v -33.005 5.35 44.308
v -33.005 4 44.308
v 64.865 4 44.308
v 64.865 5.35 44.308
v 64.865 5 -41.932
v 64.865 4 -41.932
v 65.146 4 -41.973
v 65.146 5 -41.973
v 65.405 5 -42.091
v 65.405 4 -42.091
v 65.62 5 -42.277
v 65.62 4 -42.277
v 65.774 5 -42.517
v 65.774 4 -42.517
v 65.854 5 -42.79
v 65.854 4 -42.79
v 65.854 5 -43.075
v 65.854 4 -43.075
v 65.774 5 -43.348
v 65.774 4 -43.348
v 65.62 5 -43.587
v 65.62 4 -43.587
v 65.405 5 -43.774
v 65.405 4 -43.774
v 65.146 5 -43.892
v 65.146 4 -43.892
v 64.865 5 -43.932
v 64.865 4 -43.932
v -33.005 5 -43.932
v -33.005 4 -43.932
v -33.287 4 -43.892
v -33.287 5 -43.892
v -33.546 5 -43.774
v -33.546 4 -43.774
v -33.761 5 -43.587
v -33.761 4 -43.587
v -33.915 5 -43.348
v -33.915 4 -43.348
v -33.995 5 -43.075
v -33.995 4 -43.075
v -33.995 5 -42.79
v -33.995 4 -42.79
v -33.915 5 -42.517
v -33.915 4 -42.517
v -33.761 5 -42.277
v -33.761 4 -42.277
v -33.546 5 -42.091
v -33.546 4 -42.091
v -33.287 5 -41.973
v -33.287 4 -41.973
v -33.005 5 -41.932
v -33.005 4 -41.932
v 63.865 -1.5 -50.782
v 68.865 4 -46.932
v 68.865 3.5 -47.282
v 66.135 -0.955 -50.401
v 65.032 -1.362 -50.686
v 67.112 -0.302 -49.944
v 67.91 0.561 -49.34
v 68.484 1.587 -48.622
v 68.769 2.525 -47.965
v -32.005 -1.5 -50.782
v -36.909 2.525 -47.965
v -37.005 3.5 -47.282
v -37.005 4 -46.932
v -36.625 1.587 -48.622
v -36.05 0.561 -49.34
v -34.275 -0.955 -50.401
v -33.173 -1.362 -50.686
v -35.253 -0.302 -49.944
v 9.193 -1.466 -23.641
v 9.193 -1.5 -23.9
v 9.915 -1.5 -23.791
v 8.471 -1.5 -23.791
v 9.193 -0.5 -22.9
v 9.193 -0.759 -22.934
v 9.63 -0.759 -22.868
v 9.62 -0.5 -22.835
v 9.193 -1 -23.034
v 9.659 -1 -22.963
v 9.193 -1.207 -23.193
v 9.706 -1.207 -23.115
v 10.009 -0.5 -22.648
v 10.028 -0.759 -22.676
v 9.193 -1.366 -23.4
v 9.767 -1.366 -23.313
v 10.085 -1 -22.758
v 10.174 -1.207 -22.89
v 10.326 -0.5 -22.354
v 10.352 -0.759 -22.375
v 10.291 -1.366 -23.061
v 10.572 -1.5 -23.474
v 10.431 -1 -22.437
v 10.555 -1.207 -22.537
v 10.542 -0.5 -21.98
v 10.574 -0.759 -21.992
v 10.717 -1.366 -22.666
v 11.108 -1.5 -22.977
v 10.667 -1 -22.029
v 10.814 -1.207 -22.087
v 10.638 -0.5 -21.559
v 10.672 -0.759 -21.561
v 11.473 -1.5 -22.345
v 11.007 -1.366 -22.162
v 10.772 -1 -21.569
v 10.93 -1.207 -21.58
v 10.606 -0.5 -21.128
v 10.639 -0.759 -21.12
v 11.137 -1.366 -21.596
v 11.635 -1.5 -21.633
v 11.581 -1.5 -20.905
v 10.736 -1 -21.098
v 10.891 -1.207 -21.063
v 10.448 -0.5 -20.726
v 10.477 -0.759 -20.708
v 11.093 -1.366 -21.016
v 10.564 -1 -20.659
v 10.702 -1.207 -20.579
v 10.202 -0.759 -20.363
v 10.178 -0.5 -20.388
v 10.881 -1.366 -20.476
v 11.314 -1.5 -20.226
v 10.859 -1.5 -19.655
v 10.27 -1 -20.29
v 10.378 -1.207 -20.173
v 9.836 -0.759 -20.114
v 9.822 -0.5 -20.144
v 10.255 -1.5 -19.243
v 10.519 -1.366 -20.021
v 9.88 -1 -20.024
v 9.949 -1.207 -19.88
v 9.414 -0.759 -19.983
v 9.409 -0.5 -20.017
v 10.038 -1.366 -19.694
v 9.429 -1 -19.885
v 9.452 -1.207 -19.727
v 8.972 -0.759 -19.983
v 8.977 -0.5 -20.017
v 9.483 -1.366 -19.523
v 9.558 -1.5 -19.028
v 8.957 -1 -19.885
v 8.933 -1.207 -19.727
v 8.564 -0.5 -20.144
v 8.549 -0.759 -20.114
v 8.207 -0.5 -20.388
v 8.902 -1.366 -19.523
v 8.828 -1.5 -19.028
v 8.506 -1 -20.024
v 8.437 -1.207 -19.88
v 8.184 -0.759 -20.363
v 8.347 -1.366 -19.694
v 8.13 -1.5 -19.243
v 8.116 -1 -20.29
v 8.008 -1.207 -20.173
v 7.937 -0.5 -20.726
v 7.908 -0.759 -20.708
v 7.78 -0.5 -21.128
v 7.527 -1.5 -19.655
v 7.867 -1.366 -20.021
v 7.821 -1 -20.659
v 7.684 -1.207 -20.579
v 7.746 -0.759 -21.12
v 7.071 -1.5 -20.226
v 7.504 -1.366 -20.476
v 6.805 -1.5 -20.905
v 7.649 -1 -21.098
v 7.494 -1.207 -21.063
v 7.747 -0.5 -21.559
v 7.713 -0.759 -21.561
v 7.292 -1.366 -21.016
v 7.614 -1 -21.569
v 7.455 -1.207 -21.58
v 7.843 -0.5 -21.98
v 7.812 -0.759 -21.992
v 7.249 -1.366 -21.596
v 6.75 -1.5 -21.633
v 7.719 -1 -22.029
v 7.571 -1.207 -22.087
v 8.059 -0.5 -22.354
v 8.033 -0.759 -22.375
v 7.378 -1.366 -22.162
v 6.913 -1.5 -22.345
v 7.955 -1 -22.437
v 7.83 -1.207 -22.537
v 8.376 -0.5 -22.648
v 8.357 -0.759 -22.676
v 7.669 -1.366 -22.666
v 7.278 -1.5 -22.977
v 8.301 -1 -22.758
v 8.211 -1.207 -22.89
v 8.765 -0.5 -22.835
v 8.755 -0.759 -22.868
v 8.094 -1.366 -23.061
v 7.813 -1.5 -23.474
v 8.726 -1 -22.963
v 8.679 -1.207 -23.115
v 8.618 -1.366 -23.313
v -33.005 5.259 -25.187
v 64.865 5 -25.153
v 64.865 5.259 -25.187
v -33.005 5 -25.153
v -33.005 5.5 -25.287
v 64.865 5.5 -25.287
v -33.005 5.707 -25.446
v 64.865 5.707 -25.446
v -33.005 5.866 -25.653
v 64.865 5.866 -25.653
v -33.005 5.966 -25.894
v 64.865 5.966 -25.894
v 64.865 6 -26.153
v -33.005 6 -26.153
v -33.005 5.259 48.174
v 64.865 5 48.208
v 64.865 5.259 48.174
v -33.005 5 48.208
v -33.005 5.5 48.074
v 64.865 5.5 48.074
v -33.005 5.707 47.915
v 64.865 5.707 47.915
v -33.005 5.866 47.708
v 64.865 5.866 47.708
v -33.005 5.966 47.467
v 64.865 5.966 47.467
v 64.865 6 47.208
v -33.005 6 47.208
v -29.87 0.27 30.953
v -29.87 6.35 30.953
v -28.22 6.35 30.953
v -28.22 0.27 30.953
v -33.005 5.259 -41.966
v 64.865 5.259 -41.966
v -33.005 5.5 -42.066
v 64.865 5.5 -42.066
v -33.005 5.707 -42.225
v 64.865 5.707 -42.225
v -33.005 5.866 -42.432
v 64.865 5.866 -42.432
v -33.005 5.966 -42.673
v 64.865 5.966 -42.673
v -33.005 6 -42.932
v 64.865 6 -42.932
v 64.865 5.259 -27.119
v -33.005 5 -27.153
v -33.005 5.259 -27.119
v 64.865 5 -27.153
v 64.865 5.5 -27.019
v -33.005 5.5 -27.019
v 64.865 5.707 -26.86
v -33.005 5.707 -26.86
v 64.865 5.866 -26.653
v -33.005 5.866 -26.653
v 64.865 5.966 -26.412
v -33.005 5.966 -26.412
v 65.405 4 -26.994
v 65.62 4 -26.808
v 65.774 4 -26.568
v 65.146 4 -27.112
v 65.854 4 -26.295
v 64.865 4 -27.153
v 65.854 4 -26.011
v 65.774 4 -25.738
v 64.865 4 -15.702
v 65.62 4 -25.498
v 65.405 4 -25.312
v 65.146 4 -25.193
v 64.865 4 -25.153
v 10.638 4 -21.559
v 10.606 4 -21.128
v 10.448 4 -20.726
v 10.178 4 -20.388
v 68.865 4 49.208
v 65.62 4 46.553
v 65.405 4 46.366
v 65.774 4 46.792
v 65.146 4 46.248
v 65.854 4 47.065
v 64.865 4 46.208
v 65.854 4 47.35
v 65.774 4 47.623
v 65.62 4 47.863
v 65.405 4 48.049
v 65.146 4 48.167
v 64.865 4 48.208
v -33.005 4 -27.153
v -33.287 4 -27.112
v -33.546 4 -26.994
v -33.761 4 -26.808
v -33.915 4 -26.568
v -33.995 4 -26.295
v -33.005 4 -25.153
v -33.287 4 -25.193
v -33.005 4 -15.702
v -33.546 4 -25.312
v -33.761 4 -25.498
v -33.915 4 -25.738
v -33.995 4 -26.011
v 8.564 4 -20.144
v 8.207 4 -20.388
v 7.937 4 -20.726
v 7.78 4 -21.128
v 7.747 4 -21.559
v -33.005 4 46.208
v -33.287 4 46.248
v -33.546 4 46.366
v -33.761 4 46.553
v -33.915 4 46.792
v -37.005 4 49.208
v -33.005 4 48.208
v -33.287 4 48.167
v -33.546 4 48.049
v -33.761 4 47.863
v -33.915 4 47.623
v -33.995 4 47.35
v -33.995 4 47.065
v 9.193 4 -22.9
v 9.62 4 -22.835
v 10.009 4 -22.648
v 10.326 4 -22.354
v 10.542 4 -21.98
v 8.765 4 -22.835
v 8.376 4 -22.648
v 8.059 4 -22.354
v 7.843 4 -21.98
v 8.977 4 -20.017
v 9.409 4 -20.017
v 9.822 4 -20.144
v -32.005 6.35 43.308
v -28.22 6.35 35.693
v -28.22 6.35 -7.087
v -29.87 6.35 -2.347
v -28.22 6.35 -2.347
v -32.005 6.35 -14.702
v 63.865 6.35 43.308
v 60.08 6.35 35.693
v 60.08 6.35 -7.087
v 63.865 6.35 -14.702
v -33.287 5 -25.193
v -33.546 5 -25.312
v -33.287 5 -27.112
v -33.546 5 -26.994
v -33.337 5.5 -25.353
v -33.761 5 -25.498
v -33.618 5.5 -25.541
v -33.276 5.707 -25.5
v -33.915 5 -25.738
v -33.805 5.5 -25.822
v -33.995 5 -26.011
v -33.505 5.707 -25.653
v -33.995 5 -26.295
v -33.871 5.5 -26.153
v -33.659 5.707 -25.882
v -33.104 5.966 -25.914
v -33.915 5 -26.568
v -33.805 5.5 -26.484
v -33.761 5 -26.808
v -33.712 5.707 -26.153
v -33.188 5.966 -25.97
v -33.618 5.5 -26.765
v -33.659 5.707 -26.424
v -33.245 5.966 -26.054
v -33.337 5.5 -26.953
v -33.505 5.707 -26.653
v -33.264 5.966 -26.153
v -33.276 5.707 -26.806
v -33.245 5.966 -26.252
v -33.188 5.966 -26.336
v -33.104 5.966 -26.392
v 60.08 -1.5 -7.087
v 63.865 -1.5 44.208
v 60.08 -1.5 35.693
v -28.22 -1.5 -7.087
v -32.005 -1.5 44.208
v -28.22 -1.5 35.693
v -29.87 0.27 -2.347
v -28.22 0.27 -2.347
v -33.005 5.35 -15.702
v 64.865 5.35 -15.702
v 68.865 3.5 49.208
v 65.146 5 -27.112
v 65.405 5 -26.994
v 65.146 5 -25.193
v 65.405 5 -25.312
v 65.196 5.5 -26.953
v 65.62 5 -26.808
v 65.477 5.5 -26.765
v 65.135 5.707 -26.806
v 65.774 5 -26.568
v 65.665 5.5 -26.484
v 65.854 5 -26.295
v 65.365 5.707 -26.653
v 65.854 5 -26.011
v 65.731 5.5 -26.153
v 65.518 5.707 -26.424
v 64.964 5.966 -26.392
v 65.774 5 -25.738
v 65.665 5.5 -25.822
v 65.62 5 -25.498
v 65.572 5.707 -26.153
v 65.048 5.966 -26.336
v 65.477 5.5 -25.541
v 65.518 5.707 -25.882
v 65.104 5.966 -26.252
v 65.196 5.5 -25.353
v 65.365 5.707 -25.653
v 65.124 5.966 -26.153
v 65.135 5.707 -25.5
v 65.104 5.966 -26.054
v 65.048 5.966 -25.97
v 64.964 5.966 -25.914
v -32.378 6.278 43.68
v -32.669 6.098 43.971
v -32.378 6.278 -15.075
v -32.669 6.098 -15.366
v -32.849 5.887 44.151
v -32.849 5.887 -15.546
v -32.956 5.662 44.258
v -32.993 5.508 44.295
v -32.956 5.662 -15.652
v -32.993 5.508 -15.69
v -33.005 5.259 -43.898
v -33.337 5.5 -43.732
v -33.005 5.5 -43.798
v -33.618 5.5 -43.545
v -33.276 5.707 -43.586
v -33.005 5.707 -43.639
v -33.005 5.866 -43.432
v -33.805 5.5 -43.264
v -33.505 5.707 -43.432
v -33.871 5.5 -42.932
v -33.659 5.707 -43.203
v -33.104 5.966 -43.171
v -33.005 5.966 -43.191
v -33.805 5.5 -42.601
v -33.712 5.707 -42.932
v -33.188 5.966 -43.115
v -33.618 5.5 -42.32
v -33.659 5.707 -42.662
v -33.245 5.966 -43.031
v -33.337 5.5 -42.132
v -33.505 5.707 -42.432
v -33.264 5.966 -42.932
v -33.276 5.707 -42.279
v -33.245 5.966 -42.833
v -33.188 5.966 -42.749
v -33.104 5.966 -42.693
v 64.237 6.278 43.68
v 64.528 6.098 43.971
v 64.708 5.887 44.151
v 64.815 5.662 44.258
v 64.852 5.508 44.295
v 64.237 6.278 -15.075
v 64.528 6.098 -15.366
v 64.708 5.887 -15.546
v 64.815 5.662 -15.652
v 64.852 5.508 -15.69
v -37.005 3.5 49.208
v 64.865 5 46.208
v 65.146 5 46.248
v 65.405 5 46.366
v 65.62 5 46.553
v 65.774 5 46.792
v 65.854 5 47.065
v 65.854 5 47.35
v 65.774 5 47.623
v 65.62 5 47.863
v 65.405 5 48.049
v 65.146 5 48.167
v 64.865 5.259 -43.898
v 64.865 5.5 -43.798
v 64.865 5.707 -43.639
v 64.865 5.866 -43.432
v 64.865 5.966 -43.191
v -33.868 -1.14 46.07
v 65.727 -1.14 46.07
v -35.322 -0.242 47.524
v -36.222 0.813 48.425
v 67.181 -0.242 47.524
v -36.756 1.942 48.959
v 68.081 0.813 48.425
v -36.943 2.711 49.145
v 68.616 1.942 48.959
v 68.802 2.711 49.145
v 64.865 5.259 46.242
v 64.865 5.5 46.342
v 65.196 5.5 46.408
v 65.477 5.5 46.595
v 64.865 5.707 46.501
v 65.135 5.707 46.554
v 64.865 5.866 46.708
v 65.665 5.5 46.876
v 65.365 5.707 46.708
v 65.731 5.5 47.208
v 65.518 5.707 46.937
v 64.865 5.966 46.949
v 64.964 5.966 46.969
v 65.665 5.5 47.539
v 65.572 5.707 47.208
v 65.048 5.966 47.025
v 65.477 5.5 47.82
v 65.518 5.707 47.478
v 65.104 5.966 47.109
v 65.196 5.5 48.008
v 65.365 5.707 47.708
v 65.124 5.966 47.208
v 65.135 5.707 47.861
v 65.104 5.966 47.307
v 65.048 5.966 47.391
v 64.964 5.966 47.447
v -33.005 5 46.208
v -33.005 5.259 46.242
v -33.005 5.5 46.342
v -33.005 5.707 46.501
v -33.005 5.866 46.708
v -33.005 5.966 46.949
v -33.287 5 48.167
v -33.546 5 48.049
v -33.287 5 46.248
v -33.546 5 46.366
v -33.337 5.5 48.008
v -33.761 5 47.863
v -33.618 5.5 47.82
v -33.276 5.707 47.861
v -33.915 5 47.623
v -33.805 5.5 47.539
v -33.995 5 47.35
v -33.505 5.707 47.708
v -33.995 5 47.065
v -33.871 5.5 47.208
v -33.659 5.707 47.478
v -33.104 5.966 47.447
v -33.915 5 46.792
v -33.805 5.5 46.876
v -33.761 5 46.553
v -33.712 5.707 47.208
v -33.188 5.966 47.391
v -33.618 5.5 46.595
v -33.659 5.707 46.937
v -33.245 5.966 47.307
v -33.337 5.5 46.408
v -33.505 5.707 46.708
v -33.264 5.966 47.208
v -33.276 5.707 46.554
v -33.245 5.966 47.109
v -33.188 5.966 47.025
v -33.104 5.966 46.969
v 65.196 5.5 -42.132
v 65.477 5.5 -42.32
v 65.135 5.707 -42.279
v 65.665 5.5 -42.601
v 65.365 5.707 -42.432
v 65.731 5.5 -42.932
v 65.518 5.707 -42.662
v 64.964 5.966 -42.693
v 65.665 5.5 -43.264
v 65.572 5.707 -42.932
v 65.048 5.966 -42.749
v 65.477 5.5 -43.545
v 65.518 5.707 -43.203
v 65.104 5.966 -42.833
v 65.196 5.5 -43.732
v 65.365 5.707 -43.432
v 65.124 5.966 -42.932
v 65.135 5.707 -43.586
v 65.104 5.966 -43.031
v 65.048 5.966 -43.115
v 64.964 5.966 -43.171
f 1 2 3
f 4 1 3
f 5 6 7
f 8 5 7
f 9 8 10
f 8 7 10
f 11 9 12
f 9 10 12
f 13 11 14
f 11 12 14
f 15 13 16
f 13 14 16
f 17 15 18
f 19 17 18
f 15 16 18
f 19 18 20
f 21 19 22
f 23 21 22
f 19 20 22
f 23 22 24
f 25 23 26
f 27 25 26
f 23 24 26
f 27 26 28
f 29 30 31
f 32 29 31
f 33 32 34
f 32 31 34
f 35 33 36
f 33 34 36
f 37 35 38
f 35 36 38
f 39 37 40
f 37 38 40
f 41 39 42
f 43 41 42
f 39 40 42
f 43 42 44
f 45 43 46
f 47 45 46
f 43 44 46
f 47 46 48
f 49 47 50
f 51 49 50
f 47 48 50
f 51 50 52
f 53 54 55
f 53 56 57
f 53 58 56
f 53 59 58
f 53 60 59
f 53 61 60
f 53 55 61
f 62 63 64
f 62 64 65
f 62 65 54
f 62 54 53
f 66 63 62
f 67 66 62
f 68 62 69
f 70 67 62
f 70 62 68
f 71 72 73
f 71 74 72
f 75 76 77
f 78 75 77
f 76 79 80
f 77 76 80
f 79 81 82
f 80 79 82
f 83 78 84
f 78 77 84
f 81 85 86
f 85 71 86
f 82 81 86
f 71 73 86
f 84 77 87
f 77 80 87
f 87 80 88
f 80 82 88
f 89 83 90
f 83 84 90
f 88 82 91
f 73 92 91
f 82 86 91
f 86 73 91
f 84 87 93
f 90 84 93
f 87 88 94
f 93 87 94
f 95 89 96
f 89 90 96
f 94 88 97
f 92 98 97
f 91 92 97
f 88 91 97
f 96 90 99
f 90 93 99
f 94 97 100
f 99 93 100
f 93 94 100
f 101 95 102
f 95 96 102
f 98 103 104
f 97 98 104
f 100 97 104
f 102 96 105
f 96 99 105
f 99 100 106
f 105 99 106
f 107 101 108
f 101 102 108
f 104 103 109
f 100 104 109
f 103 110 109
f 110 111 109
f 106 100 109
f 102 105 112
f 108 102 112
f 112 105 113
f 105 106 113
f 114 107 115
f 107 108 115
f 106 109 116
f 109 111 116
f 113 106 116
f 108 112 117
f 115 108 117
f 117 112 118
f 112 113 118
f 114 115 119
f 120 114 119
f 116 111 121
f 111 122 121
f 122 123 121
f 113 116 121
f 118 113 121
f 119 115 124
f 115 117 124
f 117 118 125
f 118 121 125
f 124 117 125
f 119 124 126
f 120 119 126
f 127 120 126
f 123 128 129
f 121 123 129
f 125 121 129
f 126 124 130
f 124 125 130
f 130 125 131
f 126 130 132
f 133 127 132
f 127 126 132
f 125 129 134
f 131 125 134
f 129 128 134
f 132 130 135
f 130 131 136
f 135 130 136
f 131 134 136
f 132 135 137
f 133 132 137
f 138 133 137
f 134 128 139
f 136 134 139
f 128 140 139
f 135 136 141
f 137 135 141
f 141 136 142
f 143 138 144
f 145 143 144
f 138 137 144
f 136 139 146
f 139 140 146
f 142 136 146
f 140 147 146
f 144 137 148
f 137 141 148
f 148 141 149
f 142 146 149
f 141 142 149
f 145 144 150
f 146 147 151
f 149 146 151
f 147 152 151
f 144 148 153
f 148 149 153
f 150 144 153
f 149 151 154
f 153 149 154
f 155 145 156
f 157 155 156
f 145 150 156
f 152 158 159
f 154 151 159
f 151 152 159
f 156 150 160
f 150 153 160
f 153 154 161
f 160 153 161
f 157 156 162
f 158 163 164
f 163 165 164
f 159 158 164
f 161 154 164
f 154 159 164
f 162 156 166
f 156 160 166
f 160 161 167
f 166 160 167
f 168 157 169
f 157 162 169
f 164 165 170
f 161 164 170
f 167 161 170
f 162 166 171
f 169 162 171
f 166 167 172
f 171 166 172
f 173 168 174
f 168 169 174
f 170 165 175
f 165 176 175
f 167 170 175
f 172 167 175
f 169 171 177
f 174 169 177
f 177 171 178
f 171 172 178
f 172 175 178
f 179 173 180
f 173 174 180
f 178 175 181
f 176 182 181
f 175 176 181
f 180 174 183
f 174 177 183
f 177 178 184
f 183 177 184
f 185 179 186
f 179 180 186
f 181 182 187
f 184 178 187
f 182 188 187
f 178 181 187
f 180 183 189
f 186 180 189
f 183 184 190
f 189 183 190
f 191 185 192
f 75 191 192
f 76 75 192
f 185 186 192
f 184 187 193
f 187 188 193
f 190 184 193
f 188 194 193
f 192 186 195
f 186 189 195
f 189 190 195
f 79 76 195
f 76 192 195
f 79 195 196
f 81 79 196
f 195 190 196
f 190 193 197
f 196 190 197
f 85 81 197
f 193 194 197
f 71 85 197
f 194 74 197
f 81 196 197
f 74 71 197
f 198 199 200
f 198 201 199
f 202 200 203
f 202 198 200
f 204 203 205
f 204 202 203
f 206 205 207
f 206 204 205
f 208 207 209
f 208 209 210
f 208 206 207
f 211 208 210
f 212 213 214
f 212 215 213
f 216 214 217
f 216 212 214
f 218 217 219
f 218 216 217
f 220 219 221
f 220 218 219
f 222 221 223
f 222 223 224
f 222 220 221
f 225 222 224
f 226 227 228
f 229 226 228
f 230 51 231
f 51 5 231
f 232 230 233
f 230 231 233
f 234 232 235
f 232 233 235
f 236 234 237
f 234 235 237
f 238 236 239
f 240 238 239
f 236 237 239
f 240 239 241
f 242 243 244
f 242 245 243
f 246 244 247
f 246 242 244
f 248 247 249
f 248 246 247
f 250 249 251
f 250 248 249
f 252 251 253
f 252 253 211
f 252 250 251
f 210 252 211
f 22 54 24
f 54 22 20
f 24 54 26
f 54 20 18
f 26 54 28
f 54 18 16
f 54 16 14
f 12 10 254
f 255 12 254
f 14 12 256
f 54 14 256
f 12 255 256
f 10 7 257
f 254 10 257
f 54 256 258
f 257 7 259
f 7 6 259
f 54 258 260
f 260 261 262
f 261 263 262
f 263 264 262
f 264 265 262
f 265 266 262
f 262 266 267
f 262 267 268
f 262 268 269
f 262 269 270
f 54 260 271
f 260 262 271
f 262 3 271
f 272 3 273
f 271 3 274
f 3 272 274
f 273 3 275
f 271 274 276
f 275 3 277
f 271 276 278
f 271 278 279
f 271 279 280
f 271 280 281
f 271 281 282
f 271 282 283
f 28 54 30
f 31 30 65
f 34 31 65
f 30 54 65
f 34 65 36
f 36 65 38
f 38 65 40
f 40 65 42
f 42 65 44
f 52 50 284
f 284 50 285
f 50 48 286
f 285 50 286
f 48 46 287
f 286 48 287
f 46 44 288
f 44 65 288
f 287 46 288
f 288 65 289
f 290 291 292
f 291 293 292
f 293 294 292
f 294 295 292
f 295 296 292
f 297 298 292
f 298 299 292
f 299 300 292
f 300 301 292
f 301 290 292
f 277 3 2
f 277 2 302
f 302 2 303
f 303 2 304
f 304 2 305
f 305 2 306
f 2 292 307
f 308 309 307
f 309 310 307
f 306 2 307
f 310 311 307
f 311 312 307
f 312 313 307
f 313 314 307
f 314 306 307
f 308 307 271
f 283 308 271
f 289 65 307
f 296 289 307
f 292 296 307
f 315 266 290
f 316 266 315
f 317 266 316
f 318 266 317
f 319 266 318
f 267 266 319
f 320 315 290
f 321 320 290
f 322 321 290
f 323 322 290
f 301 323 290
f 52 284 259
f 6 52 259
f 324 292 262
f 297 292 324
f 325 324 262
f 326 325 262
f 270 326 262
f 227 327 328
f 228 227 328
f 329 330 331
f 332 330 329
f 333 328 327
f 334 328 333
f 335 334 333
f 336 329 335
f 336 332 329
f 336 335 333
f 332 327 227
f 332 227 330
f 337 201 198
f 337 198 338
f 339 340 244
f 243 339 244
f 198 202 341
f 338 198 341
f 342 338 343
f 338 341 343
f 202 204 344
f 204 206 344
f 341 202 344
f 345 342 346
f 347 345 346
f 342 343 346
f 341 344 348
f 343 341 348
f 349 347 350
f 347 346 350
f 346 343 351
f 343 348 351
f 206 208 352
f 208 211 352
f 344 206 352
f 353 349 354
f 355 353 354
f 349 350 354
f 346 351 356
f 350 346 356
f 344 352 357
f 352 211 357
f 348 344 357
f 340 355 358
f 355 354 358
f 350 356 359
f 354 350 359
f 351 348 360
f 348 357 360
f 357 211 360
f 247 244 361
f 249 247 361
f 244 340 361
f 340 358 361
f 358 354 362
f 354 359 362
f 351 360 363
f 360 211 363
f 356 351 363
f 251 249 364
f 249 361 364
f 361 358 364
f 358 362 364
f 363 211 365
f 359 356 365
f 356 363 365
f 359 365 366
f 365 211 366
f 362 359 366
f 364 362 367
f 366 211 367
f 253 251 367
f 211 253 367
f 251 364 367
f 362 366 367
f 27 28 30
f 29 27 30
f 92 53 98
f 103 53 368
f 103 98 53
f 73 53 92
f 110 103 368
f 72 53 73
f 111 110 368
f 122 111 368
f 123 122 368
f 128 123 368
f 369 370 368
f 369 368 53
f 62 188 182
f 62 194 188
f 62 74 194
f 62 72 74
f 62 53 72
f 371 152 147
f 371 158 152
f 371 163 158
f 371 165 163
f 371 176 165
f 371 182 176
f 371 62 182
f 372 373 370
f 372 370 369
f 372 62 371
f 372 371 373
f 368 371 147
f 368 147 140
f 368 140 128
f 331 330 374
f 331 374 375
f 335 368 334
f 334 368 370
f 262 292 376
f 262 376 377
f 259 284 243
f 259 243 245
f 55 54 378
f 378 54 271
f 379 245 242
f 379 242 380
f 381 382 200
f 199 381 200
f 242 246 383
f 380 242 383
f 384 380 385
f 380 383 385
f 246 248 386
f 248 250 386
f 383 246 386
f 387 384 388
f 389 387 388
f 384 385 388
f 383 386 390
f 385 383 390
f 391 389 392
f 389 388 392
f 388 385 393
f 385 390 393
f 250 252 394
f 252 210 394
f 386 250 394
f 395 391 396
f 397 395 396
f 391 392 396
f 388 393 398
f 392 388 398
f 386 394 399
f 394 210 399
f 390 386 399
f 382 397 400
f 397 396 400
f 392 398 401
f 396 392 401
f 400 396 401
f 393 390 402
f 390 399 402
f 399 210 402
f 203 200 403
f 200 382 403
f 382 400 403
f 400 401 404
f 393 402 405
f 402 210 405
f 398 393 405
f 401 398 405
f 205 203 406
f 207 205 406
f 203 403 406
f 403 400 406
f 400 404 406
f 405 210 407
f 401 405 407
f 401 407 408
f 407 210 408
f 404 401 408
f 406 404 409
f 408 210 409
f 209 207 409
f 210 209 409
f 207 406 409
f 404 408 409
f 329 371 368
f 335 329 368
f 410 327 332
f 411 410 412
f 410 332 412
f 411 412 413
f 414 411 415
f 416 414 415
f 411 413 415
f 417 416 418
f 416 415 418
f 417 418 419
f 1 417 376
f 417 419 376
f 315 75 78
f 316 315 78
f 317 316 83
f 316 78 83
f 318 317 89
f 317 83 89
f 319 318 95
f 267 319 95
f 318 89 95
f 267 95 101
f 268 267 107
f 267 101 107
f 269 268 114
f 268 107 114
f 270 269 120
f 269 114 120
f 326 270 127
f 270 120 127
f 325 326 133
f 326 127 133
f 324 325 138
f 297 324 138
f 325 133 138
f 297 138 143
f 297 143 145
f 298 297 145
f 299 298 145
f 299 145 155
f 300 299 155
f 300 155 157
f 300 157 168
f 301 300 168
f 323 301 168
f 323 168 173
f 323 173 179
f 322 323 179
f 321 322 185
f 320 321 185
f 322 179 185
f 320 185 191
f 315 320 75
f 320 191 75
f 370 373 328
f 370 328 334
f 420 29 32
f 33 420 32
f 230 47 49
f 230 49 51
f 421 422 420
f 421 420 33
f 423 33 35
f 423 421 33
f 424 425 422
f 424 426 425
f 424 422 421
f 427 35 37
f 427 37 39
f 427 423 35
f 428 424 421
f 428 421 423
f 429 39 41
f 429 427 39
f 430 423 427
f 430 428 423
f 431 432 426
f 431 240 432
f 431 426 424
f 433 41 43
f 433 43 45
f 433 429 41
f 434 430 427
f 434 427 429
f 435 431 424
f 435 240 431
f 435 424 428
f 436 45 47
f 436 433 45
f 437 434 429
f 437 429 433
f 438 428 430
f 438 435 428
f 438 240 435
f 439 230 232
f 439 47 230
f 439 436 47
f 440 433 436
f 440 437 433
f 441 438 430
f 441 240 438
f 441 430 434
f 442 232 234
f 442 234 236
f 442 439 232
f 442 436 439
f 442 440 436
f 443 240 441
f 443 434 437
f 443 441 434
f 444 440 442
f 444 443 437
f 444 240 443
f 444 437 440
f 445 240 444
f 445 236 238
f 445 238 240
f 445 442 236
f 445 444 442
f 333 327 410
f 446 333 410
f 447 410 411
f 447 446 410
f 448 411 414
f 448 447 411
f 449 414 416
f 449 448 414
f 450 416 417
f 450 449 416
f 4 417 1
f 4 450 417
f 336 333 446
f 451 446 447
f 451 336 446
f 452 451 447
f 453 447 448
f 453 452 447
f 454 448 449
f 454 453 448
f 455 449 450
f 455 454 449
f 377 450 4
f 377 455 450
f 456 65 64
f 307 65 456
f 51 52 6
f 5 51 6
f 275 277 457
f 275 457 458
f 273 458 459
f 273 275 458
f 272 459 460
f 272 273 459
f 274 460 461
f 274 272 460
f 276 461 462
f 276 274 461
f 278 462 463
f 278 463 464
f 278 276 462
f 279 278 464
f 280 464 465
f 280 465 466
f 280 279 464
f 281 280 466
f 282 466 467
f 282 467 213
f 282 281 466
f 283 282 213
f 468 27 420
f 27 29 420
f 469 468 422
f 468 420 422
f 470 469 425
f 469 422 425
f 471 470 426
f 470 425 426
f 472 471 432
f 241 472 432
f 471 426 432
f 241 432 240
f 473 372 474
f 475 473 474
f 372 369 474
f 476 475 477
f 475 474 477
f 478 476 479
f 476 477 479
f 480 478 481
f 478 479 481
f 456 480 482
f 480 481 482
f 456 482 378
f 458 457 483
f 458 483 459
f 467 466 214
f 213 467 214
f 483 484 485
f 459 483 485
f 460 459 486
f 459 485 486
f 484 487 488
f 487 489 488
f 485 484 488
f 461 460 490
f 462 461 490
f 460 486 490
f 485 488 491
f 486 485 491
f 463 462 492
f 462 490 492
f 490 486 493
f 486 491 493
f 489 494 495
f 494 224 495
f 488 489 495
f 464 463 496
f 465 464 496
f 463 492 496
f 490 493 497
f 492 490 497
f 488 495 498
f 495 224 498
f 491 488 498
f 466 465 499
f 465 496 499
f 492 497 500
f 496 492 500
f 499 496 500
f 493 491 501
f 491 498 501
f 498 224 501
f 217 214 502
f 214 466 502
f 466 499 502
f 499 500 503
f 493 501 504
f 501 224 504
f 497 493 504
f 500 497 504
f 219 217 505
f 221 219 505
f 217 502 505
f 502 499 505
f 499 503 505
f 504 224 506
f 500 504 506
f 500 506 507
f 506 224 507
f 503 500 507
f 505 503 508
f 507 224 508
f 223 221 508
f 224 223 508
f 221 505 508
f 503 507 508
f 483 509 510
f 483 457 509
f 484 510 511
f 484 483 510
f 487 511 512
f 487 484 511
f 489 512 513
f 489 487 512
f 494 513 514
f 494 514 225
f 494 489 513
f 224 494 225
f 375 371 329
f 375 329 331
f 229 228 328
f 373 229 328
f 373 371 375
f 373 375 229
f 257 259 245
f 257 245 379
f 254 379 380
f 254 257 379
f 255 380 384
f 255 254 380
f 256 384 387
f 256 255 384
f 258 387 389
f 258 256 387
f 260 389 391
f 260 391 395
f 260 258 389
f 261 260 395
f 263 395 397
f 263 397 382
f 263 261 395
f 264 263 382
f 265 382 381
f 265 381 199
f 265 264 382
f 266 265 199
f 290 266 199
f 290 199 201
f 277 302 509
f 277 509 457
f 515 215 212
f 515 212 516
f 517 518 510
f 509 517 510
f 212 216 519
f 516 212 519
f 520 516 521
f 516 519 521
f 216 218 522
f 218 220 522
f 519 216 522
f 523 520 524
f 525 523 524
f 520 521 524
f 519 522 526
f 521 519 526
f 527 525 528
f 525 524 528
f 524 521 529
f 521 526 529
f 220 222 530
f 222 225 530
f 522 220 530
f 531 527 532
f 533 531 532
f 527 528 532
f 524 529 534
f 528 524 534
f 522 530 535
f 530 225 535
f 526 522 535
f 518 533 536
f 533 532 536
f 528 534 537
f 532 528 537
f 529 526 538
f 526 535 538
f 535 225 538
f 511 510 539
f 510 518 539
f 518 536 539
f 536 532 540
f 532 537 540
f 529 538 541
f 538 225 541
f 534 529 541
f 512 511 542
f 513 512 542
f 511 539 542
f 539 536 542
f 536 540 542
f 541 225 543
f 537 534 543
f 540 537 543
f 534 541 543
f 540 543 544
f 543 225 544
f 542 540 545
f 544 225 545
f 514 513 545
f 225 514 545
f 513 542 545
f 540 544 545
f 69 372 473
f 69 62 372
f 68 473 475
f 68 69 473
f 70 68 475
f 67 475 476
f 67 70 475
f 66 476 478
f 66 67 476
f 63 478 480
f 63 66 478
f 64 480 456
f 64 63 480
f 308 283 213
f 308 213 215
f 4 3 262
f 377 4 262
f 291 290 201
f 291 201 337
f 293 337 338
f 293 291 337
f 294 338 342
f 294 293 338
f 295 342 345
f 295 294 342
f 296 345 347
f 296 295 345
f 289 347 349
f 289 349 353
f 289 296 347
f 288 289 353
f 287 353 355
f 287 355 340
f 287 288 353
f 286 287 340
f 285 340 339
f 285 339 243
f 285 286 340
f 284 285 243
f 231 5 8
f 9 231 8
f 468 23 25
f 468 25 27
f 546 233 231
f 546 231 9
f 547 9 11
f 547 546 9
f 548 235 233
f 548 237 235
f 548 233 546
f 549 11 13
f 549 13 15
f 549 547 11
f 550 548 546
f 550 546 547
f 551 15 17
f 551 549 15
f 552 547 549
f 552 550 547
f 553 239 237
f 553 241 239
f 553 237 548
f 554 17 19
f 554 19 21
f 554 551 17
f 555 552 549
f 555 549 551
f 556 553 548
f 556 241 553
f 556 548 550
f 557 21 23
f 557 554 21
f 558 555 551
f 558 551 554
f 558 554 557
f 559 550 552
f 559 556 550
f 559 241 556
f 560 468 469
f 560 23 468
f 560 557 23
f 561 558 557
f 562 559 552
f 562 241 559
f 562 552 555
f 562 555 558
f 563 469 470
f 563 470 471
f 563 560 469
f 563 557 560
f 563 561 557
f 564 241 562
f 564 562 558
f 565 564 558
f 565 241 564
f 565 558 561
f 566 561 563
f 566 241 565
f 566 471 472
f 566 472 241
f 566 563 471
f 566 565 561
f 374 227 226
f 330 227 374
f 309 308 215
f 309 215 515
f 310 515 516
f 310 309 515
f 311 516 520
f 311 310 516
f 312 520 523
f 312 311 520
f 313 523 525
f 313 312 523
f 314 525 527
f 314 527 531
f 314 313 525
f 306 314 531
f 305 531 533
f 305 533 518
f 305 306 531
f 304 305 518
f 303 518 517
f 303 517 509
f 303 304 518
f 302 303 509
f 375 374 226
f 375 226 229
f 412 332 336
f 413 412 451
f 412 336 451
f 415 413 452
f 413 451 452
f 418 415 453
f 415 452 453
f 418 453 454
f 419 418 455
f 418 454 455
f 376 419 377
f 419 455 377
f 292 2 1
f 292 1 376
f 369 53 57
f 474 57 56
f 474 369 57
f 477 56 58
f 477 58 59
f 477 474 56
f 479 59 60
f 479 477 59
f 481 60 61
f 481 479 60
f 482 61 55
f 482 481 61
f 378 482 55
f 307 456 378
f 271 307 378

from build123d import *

# Parameters (mm, degrees)
SKETCH1_W           = 105.87
SKETCH1_H           = 82.04
SKETCH1_W_2         = 88.3
SKETCH1_H_2         = 42.78
BOSS_EXTRUDE1_DEPTH = 4
SKETCH1_4_W         = 97.87
SKETCH1_4_H         = 60.01
SKETCH1_4_W_2       = 88.3
SKETCH1_4_H_2       = 42.78
BOSS_EXTRUDE2_DEPTH = 6.35
SKETCH2_R           = 1.449406475
CUT_EXTRUDE1_DEPTH  = 85.876744687
BOSS_EXTRUDE3_DEPTH = 105.87
FILLET6_R           = 1
BOSS_EXTRUDE4_DEPTH = 2
FILLET7_R           = 1
SKETCH5_W           = 1.65
SKETCH5_H           = 33.3
CUT_EXTRUDE3_DEPTH  = 6.08
BOSS_EXTRUDE6_START = 1.5
SKETCH10_W          = 105.87
SKETCH10_H          = 92.304593272
SKETCH10_R          = 1.449406475
SKETCH10_W_2        = 88.3
SKETCH10_H_2        = 42.78
BOSS_EXTRUDE6_DEPTH = 1.5
BOSS_EXTRUDE7_DEPTH = 105.87
FILLET9_R           = 1
FILLET10_R          = 5


with BuildPart() as part:
    # Sketch1 → Boss-Extrude1 (new body)
    with BuildSketch(Plane(origin=(0, 0, 0), x_dir=(1, 0, 0), z_dir=(0, 1, 0))):
        with Locations((15.929638567, -8.187731543)):
            Rectangle(SKETCH1_W, SKETCH1_H)
        with Locations((15.929638567, -14.302731543)):
            Rectangle(SKETCH1_W_2, SKETCH1_H_2, mode=Mode.SUBTRACT)
    extrude(amount=BOSS_EXTRUDE1_DEPTH)

    # Sketch1<4> → Boss-Extrude2 (add)
    with BuildSketch(Plane(origin=(0, 0, 0), x_dir=(1, 0, 0), z_dir=(0, 1, 0))):
        with Locations((15.929638567, -14.302731543)):
            Rectangle(SKETCH1_4_W, SKETCH1_4_H)
        with Locations((15.929638567, -14.302731543)):
            Rectangle(SKETCH1_4_W_2, SKETCH1_4_H_2, mode=Mode.SUBTRACT)
    extrude(amount=BOSS_EXTRUDE2_DEPTH)

    # Sketch2 → Cut-Extrude1 (cut, through all)
    with BuildSketch(Plane.XZ):
        with Locations(Location((9.192630415, -21.45022355, 0), (0, 0, 270))):
            Circle(SKETCH2_R)
    extrude(amount=-CUT_EXTRUDE1_DEPTH, mode=Mode.SUBTRACT)

    # Sketch3 → Boss-Extrude3 (add)
    with BuildSketch(Plane.ZY.offset(37.005361433)):
        Polygon((-32.832268457, 0), (-49.732268457, 0), (-46.932268457, 4), (-32.832268457, 4), align=None)
    extrude(amount=-BOSS_EXTRUDE3_DEPTH)

    # Fillet6
    fillet6_edges = [part.edges().sort_by_distance(p)[0] for p in [
        (-33.005361433, 6.35, 14.302731543),
        (15.929638567, 6.35, 44.307731543),
        (64.864638567, 6.35, 14.302731543),
        (15.929638567, 6.35, -15.702268457),
    ]]
    fillet(fillet6_edges, radius=FILLET6_R)

    # Sketch4 → Boss-Extrude4 (add)
    with BuildSketch(Plane(origin=(0, 4, 0), x_dir=(1, 0, 0), z_dir=(0, 1, 0))):
        with BuildLine():
            Line((64.864638567, 25.152939827), (-33.005361433, 25.152939827))
            ThreePointArc((-33.005361433, 25.152939827), (-34.005361433, 26.152939827), (-33.005361433, 27.152939827))
            Line((-33.005361433, 27.152939827), (64.864638567, 27.152939827))
            ThreePointArc((64.864638567, 27.152939827), (65.864638567, 26.152939827), (64.864638567, 25.152939827))
        make_face()
        with BuildLine():
            Line((-33.005361433, 41.932268457), (64.864638567, 41.932268457))
            ThreePointArc((64.864638567, 41.932268457), (65.864638567, 42.932268457), (64.864638567, 43.932268457))
            Line((64.864638567, 43.932268457), (-33.005361433, 43.932268457))
            ThreePointArc((-33.005361433, 43.932268457), (-34.005361433, 42.932268457), (-33.005361433, 41.932268457))
        make_face()
        with BuildLine():
            Line((64.864638567, -48.207731543), (-33.005361433, -48.207731543))
            ThreePointArc((-33.005361433, -48.207731543), (-34.005361433, -47.207731543), (-33.005361433, -46.207731543))
            Line((-33.005361433, -46.207731543), (64.864638567, -46.207731543))
            ThreePointArc((64.864638567, -46.207731543), (65.864638567, -47.207731543), (64.864638567, -48.207731543))
        make_face()
    extrude(amount=BOSS_EXTRUDE4_DEPTH)

    # Fillet7
    fillet7_edges = [part.edges().sort_by_distance(p)[0] for p in [
        (65.864638567, 6, 47.207731543),
        (15.929638567, 6, 46.207731543),
        (-34.005361433, 6, 47.207731543),
        (15.929638567, 6, 48.207731543),
        (-34.005361433, 6, -42.932268457),
        (15.929638567, 6, -41.932268457),
        (65.864638567, 6, -42.932268457),
        (15.929638567, 6, -43.932268457),
        (65.864638567, 6, -26.152939827),
        (15.929638567, 6, -27.152939827),
        (-34.005361433, 6, -26.152939827),
        (15.929638567, 6, -25.152939827),
    ]]
    fillet(fillet7_edges, radius=FILLET7_R - 0.0001)  # a hair under: the kernel refuses the full size

    # Sketch5 → Cut-Extrude3 (cut)
    with BuildSketch(Plane(origin=(0, 6.35, 0), x_dir=(1, 0, 0), z_dir=(0, 1, 0))):
        with Locations((-29.045361433, -14.302731543)):
            Rectangle(SKETCH5_W, SKETCH5_H)
    extrude(amount=-CUT_EXTRUDE3_DEPTH, mode=Mode.SUBTRACT)

    # Sketch10 → Boss-Extrude6 (add)
    with BuildSketch(Plane.XZ.offset(BOSS_EXTRUDE6_START)):
        with Locations((15.929638567, 3.055434907)):
            Rectangle(SKETCH10_W, SKETCH10_H)
        with Locations(Location((9.192630415, -21.45022355, 0), (0, 0, 270))):
            Circle(SKETCH10_R, mode=Mode.SUBTRACT)
        with Locations((15.929638567, 14.302731543)):
            Rectangle(SKETCH10_W_2, SKETCH10_H_2, mode=Mode.SUBTRACT)
    extrude(amount=-BOSS_EXTRUDE6_DEPTH)

    # Sketch11 → Boss-Extrude7 (add)
    with BuildSketch(Plane.ZY.offset(37.005361433)):
        Polygon((-49.732268457, 0), (-50.782268457, -1.5), (-43.096861729, -1.5), (-43.096861729, 0), align=None)
    extrude(amount=-BOSS_EXTRUDE7_DEPTH)

    # Fillet9
    fillet9_edges = [part.edges().sort_by_distance(p)[0] for p in [
        (9.192630415, -1.5, -20.000817075),
    ]]
    fillet(fillet9_edges, radius=FILLET9_R)

    # Fillet10
    fillet10_edges = [part.edges().sort_by_distance(p)[0] for p in [
        (-37.005361433, -1.5, -0.787268457),
        (68.864638567, -1.5, -0.787268457),
        (15.929638567, -1.5, 49.207731543),
    ]]
    fillet(fillet10_edges, radius=FILLET10_R)


solid = part.part
